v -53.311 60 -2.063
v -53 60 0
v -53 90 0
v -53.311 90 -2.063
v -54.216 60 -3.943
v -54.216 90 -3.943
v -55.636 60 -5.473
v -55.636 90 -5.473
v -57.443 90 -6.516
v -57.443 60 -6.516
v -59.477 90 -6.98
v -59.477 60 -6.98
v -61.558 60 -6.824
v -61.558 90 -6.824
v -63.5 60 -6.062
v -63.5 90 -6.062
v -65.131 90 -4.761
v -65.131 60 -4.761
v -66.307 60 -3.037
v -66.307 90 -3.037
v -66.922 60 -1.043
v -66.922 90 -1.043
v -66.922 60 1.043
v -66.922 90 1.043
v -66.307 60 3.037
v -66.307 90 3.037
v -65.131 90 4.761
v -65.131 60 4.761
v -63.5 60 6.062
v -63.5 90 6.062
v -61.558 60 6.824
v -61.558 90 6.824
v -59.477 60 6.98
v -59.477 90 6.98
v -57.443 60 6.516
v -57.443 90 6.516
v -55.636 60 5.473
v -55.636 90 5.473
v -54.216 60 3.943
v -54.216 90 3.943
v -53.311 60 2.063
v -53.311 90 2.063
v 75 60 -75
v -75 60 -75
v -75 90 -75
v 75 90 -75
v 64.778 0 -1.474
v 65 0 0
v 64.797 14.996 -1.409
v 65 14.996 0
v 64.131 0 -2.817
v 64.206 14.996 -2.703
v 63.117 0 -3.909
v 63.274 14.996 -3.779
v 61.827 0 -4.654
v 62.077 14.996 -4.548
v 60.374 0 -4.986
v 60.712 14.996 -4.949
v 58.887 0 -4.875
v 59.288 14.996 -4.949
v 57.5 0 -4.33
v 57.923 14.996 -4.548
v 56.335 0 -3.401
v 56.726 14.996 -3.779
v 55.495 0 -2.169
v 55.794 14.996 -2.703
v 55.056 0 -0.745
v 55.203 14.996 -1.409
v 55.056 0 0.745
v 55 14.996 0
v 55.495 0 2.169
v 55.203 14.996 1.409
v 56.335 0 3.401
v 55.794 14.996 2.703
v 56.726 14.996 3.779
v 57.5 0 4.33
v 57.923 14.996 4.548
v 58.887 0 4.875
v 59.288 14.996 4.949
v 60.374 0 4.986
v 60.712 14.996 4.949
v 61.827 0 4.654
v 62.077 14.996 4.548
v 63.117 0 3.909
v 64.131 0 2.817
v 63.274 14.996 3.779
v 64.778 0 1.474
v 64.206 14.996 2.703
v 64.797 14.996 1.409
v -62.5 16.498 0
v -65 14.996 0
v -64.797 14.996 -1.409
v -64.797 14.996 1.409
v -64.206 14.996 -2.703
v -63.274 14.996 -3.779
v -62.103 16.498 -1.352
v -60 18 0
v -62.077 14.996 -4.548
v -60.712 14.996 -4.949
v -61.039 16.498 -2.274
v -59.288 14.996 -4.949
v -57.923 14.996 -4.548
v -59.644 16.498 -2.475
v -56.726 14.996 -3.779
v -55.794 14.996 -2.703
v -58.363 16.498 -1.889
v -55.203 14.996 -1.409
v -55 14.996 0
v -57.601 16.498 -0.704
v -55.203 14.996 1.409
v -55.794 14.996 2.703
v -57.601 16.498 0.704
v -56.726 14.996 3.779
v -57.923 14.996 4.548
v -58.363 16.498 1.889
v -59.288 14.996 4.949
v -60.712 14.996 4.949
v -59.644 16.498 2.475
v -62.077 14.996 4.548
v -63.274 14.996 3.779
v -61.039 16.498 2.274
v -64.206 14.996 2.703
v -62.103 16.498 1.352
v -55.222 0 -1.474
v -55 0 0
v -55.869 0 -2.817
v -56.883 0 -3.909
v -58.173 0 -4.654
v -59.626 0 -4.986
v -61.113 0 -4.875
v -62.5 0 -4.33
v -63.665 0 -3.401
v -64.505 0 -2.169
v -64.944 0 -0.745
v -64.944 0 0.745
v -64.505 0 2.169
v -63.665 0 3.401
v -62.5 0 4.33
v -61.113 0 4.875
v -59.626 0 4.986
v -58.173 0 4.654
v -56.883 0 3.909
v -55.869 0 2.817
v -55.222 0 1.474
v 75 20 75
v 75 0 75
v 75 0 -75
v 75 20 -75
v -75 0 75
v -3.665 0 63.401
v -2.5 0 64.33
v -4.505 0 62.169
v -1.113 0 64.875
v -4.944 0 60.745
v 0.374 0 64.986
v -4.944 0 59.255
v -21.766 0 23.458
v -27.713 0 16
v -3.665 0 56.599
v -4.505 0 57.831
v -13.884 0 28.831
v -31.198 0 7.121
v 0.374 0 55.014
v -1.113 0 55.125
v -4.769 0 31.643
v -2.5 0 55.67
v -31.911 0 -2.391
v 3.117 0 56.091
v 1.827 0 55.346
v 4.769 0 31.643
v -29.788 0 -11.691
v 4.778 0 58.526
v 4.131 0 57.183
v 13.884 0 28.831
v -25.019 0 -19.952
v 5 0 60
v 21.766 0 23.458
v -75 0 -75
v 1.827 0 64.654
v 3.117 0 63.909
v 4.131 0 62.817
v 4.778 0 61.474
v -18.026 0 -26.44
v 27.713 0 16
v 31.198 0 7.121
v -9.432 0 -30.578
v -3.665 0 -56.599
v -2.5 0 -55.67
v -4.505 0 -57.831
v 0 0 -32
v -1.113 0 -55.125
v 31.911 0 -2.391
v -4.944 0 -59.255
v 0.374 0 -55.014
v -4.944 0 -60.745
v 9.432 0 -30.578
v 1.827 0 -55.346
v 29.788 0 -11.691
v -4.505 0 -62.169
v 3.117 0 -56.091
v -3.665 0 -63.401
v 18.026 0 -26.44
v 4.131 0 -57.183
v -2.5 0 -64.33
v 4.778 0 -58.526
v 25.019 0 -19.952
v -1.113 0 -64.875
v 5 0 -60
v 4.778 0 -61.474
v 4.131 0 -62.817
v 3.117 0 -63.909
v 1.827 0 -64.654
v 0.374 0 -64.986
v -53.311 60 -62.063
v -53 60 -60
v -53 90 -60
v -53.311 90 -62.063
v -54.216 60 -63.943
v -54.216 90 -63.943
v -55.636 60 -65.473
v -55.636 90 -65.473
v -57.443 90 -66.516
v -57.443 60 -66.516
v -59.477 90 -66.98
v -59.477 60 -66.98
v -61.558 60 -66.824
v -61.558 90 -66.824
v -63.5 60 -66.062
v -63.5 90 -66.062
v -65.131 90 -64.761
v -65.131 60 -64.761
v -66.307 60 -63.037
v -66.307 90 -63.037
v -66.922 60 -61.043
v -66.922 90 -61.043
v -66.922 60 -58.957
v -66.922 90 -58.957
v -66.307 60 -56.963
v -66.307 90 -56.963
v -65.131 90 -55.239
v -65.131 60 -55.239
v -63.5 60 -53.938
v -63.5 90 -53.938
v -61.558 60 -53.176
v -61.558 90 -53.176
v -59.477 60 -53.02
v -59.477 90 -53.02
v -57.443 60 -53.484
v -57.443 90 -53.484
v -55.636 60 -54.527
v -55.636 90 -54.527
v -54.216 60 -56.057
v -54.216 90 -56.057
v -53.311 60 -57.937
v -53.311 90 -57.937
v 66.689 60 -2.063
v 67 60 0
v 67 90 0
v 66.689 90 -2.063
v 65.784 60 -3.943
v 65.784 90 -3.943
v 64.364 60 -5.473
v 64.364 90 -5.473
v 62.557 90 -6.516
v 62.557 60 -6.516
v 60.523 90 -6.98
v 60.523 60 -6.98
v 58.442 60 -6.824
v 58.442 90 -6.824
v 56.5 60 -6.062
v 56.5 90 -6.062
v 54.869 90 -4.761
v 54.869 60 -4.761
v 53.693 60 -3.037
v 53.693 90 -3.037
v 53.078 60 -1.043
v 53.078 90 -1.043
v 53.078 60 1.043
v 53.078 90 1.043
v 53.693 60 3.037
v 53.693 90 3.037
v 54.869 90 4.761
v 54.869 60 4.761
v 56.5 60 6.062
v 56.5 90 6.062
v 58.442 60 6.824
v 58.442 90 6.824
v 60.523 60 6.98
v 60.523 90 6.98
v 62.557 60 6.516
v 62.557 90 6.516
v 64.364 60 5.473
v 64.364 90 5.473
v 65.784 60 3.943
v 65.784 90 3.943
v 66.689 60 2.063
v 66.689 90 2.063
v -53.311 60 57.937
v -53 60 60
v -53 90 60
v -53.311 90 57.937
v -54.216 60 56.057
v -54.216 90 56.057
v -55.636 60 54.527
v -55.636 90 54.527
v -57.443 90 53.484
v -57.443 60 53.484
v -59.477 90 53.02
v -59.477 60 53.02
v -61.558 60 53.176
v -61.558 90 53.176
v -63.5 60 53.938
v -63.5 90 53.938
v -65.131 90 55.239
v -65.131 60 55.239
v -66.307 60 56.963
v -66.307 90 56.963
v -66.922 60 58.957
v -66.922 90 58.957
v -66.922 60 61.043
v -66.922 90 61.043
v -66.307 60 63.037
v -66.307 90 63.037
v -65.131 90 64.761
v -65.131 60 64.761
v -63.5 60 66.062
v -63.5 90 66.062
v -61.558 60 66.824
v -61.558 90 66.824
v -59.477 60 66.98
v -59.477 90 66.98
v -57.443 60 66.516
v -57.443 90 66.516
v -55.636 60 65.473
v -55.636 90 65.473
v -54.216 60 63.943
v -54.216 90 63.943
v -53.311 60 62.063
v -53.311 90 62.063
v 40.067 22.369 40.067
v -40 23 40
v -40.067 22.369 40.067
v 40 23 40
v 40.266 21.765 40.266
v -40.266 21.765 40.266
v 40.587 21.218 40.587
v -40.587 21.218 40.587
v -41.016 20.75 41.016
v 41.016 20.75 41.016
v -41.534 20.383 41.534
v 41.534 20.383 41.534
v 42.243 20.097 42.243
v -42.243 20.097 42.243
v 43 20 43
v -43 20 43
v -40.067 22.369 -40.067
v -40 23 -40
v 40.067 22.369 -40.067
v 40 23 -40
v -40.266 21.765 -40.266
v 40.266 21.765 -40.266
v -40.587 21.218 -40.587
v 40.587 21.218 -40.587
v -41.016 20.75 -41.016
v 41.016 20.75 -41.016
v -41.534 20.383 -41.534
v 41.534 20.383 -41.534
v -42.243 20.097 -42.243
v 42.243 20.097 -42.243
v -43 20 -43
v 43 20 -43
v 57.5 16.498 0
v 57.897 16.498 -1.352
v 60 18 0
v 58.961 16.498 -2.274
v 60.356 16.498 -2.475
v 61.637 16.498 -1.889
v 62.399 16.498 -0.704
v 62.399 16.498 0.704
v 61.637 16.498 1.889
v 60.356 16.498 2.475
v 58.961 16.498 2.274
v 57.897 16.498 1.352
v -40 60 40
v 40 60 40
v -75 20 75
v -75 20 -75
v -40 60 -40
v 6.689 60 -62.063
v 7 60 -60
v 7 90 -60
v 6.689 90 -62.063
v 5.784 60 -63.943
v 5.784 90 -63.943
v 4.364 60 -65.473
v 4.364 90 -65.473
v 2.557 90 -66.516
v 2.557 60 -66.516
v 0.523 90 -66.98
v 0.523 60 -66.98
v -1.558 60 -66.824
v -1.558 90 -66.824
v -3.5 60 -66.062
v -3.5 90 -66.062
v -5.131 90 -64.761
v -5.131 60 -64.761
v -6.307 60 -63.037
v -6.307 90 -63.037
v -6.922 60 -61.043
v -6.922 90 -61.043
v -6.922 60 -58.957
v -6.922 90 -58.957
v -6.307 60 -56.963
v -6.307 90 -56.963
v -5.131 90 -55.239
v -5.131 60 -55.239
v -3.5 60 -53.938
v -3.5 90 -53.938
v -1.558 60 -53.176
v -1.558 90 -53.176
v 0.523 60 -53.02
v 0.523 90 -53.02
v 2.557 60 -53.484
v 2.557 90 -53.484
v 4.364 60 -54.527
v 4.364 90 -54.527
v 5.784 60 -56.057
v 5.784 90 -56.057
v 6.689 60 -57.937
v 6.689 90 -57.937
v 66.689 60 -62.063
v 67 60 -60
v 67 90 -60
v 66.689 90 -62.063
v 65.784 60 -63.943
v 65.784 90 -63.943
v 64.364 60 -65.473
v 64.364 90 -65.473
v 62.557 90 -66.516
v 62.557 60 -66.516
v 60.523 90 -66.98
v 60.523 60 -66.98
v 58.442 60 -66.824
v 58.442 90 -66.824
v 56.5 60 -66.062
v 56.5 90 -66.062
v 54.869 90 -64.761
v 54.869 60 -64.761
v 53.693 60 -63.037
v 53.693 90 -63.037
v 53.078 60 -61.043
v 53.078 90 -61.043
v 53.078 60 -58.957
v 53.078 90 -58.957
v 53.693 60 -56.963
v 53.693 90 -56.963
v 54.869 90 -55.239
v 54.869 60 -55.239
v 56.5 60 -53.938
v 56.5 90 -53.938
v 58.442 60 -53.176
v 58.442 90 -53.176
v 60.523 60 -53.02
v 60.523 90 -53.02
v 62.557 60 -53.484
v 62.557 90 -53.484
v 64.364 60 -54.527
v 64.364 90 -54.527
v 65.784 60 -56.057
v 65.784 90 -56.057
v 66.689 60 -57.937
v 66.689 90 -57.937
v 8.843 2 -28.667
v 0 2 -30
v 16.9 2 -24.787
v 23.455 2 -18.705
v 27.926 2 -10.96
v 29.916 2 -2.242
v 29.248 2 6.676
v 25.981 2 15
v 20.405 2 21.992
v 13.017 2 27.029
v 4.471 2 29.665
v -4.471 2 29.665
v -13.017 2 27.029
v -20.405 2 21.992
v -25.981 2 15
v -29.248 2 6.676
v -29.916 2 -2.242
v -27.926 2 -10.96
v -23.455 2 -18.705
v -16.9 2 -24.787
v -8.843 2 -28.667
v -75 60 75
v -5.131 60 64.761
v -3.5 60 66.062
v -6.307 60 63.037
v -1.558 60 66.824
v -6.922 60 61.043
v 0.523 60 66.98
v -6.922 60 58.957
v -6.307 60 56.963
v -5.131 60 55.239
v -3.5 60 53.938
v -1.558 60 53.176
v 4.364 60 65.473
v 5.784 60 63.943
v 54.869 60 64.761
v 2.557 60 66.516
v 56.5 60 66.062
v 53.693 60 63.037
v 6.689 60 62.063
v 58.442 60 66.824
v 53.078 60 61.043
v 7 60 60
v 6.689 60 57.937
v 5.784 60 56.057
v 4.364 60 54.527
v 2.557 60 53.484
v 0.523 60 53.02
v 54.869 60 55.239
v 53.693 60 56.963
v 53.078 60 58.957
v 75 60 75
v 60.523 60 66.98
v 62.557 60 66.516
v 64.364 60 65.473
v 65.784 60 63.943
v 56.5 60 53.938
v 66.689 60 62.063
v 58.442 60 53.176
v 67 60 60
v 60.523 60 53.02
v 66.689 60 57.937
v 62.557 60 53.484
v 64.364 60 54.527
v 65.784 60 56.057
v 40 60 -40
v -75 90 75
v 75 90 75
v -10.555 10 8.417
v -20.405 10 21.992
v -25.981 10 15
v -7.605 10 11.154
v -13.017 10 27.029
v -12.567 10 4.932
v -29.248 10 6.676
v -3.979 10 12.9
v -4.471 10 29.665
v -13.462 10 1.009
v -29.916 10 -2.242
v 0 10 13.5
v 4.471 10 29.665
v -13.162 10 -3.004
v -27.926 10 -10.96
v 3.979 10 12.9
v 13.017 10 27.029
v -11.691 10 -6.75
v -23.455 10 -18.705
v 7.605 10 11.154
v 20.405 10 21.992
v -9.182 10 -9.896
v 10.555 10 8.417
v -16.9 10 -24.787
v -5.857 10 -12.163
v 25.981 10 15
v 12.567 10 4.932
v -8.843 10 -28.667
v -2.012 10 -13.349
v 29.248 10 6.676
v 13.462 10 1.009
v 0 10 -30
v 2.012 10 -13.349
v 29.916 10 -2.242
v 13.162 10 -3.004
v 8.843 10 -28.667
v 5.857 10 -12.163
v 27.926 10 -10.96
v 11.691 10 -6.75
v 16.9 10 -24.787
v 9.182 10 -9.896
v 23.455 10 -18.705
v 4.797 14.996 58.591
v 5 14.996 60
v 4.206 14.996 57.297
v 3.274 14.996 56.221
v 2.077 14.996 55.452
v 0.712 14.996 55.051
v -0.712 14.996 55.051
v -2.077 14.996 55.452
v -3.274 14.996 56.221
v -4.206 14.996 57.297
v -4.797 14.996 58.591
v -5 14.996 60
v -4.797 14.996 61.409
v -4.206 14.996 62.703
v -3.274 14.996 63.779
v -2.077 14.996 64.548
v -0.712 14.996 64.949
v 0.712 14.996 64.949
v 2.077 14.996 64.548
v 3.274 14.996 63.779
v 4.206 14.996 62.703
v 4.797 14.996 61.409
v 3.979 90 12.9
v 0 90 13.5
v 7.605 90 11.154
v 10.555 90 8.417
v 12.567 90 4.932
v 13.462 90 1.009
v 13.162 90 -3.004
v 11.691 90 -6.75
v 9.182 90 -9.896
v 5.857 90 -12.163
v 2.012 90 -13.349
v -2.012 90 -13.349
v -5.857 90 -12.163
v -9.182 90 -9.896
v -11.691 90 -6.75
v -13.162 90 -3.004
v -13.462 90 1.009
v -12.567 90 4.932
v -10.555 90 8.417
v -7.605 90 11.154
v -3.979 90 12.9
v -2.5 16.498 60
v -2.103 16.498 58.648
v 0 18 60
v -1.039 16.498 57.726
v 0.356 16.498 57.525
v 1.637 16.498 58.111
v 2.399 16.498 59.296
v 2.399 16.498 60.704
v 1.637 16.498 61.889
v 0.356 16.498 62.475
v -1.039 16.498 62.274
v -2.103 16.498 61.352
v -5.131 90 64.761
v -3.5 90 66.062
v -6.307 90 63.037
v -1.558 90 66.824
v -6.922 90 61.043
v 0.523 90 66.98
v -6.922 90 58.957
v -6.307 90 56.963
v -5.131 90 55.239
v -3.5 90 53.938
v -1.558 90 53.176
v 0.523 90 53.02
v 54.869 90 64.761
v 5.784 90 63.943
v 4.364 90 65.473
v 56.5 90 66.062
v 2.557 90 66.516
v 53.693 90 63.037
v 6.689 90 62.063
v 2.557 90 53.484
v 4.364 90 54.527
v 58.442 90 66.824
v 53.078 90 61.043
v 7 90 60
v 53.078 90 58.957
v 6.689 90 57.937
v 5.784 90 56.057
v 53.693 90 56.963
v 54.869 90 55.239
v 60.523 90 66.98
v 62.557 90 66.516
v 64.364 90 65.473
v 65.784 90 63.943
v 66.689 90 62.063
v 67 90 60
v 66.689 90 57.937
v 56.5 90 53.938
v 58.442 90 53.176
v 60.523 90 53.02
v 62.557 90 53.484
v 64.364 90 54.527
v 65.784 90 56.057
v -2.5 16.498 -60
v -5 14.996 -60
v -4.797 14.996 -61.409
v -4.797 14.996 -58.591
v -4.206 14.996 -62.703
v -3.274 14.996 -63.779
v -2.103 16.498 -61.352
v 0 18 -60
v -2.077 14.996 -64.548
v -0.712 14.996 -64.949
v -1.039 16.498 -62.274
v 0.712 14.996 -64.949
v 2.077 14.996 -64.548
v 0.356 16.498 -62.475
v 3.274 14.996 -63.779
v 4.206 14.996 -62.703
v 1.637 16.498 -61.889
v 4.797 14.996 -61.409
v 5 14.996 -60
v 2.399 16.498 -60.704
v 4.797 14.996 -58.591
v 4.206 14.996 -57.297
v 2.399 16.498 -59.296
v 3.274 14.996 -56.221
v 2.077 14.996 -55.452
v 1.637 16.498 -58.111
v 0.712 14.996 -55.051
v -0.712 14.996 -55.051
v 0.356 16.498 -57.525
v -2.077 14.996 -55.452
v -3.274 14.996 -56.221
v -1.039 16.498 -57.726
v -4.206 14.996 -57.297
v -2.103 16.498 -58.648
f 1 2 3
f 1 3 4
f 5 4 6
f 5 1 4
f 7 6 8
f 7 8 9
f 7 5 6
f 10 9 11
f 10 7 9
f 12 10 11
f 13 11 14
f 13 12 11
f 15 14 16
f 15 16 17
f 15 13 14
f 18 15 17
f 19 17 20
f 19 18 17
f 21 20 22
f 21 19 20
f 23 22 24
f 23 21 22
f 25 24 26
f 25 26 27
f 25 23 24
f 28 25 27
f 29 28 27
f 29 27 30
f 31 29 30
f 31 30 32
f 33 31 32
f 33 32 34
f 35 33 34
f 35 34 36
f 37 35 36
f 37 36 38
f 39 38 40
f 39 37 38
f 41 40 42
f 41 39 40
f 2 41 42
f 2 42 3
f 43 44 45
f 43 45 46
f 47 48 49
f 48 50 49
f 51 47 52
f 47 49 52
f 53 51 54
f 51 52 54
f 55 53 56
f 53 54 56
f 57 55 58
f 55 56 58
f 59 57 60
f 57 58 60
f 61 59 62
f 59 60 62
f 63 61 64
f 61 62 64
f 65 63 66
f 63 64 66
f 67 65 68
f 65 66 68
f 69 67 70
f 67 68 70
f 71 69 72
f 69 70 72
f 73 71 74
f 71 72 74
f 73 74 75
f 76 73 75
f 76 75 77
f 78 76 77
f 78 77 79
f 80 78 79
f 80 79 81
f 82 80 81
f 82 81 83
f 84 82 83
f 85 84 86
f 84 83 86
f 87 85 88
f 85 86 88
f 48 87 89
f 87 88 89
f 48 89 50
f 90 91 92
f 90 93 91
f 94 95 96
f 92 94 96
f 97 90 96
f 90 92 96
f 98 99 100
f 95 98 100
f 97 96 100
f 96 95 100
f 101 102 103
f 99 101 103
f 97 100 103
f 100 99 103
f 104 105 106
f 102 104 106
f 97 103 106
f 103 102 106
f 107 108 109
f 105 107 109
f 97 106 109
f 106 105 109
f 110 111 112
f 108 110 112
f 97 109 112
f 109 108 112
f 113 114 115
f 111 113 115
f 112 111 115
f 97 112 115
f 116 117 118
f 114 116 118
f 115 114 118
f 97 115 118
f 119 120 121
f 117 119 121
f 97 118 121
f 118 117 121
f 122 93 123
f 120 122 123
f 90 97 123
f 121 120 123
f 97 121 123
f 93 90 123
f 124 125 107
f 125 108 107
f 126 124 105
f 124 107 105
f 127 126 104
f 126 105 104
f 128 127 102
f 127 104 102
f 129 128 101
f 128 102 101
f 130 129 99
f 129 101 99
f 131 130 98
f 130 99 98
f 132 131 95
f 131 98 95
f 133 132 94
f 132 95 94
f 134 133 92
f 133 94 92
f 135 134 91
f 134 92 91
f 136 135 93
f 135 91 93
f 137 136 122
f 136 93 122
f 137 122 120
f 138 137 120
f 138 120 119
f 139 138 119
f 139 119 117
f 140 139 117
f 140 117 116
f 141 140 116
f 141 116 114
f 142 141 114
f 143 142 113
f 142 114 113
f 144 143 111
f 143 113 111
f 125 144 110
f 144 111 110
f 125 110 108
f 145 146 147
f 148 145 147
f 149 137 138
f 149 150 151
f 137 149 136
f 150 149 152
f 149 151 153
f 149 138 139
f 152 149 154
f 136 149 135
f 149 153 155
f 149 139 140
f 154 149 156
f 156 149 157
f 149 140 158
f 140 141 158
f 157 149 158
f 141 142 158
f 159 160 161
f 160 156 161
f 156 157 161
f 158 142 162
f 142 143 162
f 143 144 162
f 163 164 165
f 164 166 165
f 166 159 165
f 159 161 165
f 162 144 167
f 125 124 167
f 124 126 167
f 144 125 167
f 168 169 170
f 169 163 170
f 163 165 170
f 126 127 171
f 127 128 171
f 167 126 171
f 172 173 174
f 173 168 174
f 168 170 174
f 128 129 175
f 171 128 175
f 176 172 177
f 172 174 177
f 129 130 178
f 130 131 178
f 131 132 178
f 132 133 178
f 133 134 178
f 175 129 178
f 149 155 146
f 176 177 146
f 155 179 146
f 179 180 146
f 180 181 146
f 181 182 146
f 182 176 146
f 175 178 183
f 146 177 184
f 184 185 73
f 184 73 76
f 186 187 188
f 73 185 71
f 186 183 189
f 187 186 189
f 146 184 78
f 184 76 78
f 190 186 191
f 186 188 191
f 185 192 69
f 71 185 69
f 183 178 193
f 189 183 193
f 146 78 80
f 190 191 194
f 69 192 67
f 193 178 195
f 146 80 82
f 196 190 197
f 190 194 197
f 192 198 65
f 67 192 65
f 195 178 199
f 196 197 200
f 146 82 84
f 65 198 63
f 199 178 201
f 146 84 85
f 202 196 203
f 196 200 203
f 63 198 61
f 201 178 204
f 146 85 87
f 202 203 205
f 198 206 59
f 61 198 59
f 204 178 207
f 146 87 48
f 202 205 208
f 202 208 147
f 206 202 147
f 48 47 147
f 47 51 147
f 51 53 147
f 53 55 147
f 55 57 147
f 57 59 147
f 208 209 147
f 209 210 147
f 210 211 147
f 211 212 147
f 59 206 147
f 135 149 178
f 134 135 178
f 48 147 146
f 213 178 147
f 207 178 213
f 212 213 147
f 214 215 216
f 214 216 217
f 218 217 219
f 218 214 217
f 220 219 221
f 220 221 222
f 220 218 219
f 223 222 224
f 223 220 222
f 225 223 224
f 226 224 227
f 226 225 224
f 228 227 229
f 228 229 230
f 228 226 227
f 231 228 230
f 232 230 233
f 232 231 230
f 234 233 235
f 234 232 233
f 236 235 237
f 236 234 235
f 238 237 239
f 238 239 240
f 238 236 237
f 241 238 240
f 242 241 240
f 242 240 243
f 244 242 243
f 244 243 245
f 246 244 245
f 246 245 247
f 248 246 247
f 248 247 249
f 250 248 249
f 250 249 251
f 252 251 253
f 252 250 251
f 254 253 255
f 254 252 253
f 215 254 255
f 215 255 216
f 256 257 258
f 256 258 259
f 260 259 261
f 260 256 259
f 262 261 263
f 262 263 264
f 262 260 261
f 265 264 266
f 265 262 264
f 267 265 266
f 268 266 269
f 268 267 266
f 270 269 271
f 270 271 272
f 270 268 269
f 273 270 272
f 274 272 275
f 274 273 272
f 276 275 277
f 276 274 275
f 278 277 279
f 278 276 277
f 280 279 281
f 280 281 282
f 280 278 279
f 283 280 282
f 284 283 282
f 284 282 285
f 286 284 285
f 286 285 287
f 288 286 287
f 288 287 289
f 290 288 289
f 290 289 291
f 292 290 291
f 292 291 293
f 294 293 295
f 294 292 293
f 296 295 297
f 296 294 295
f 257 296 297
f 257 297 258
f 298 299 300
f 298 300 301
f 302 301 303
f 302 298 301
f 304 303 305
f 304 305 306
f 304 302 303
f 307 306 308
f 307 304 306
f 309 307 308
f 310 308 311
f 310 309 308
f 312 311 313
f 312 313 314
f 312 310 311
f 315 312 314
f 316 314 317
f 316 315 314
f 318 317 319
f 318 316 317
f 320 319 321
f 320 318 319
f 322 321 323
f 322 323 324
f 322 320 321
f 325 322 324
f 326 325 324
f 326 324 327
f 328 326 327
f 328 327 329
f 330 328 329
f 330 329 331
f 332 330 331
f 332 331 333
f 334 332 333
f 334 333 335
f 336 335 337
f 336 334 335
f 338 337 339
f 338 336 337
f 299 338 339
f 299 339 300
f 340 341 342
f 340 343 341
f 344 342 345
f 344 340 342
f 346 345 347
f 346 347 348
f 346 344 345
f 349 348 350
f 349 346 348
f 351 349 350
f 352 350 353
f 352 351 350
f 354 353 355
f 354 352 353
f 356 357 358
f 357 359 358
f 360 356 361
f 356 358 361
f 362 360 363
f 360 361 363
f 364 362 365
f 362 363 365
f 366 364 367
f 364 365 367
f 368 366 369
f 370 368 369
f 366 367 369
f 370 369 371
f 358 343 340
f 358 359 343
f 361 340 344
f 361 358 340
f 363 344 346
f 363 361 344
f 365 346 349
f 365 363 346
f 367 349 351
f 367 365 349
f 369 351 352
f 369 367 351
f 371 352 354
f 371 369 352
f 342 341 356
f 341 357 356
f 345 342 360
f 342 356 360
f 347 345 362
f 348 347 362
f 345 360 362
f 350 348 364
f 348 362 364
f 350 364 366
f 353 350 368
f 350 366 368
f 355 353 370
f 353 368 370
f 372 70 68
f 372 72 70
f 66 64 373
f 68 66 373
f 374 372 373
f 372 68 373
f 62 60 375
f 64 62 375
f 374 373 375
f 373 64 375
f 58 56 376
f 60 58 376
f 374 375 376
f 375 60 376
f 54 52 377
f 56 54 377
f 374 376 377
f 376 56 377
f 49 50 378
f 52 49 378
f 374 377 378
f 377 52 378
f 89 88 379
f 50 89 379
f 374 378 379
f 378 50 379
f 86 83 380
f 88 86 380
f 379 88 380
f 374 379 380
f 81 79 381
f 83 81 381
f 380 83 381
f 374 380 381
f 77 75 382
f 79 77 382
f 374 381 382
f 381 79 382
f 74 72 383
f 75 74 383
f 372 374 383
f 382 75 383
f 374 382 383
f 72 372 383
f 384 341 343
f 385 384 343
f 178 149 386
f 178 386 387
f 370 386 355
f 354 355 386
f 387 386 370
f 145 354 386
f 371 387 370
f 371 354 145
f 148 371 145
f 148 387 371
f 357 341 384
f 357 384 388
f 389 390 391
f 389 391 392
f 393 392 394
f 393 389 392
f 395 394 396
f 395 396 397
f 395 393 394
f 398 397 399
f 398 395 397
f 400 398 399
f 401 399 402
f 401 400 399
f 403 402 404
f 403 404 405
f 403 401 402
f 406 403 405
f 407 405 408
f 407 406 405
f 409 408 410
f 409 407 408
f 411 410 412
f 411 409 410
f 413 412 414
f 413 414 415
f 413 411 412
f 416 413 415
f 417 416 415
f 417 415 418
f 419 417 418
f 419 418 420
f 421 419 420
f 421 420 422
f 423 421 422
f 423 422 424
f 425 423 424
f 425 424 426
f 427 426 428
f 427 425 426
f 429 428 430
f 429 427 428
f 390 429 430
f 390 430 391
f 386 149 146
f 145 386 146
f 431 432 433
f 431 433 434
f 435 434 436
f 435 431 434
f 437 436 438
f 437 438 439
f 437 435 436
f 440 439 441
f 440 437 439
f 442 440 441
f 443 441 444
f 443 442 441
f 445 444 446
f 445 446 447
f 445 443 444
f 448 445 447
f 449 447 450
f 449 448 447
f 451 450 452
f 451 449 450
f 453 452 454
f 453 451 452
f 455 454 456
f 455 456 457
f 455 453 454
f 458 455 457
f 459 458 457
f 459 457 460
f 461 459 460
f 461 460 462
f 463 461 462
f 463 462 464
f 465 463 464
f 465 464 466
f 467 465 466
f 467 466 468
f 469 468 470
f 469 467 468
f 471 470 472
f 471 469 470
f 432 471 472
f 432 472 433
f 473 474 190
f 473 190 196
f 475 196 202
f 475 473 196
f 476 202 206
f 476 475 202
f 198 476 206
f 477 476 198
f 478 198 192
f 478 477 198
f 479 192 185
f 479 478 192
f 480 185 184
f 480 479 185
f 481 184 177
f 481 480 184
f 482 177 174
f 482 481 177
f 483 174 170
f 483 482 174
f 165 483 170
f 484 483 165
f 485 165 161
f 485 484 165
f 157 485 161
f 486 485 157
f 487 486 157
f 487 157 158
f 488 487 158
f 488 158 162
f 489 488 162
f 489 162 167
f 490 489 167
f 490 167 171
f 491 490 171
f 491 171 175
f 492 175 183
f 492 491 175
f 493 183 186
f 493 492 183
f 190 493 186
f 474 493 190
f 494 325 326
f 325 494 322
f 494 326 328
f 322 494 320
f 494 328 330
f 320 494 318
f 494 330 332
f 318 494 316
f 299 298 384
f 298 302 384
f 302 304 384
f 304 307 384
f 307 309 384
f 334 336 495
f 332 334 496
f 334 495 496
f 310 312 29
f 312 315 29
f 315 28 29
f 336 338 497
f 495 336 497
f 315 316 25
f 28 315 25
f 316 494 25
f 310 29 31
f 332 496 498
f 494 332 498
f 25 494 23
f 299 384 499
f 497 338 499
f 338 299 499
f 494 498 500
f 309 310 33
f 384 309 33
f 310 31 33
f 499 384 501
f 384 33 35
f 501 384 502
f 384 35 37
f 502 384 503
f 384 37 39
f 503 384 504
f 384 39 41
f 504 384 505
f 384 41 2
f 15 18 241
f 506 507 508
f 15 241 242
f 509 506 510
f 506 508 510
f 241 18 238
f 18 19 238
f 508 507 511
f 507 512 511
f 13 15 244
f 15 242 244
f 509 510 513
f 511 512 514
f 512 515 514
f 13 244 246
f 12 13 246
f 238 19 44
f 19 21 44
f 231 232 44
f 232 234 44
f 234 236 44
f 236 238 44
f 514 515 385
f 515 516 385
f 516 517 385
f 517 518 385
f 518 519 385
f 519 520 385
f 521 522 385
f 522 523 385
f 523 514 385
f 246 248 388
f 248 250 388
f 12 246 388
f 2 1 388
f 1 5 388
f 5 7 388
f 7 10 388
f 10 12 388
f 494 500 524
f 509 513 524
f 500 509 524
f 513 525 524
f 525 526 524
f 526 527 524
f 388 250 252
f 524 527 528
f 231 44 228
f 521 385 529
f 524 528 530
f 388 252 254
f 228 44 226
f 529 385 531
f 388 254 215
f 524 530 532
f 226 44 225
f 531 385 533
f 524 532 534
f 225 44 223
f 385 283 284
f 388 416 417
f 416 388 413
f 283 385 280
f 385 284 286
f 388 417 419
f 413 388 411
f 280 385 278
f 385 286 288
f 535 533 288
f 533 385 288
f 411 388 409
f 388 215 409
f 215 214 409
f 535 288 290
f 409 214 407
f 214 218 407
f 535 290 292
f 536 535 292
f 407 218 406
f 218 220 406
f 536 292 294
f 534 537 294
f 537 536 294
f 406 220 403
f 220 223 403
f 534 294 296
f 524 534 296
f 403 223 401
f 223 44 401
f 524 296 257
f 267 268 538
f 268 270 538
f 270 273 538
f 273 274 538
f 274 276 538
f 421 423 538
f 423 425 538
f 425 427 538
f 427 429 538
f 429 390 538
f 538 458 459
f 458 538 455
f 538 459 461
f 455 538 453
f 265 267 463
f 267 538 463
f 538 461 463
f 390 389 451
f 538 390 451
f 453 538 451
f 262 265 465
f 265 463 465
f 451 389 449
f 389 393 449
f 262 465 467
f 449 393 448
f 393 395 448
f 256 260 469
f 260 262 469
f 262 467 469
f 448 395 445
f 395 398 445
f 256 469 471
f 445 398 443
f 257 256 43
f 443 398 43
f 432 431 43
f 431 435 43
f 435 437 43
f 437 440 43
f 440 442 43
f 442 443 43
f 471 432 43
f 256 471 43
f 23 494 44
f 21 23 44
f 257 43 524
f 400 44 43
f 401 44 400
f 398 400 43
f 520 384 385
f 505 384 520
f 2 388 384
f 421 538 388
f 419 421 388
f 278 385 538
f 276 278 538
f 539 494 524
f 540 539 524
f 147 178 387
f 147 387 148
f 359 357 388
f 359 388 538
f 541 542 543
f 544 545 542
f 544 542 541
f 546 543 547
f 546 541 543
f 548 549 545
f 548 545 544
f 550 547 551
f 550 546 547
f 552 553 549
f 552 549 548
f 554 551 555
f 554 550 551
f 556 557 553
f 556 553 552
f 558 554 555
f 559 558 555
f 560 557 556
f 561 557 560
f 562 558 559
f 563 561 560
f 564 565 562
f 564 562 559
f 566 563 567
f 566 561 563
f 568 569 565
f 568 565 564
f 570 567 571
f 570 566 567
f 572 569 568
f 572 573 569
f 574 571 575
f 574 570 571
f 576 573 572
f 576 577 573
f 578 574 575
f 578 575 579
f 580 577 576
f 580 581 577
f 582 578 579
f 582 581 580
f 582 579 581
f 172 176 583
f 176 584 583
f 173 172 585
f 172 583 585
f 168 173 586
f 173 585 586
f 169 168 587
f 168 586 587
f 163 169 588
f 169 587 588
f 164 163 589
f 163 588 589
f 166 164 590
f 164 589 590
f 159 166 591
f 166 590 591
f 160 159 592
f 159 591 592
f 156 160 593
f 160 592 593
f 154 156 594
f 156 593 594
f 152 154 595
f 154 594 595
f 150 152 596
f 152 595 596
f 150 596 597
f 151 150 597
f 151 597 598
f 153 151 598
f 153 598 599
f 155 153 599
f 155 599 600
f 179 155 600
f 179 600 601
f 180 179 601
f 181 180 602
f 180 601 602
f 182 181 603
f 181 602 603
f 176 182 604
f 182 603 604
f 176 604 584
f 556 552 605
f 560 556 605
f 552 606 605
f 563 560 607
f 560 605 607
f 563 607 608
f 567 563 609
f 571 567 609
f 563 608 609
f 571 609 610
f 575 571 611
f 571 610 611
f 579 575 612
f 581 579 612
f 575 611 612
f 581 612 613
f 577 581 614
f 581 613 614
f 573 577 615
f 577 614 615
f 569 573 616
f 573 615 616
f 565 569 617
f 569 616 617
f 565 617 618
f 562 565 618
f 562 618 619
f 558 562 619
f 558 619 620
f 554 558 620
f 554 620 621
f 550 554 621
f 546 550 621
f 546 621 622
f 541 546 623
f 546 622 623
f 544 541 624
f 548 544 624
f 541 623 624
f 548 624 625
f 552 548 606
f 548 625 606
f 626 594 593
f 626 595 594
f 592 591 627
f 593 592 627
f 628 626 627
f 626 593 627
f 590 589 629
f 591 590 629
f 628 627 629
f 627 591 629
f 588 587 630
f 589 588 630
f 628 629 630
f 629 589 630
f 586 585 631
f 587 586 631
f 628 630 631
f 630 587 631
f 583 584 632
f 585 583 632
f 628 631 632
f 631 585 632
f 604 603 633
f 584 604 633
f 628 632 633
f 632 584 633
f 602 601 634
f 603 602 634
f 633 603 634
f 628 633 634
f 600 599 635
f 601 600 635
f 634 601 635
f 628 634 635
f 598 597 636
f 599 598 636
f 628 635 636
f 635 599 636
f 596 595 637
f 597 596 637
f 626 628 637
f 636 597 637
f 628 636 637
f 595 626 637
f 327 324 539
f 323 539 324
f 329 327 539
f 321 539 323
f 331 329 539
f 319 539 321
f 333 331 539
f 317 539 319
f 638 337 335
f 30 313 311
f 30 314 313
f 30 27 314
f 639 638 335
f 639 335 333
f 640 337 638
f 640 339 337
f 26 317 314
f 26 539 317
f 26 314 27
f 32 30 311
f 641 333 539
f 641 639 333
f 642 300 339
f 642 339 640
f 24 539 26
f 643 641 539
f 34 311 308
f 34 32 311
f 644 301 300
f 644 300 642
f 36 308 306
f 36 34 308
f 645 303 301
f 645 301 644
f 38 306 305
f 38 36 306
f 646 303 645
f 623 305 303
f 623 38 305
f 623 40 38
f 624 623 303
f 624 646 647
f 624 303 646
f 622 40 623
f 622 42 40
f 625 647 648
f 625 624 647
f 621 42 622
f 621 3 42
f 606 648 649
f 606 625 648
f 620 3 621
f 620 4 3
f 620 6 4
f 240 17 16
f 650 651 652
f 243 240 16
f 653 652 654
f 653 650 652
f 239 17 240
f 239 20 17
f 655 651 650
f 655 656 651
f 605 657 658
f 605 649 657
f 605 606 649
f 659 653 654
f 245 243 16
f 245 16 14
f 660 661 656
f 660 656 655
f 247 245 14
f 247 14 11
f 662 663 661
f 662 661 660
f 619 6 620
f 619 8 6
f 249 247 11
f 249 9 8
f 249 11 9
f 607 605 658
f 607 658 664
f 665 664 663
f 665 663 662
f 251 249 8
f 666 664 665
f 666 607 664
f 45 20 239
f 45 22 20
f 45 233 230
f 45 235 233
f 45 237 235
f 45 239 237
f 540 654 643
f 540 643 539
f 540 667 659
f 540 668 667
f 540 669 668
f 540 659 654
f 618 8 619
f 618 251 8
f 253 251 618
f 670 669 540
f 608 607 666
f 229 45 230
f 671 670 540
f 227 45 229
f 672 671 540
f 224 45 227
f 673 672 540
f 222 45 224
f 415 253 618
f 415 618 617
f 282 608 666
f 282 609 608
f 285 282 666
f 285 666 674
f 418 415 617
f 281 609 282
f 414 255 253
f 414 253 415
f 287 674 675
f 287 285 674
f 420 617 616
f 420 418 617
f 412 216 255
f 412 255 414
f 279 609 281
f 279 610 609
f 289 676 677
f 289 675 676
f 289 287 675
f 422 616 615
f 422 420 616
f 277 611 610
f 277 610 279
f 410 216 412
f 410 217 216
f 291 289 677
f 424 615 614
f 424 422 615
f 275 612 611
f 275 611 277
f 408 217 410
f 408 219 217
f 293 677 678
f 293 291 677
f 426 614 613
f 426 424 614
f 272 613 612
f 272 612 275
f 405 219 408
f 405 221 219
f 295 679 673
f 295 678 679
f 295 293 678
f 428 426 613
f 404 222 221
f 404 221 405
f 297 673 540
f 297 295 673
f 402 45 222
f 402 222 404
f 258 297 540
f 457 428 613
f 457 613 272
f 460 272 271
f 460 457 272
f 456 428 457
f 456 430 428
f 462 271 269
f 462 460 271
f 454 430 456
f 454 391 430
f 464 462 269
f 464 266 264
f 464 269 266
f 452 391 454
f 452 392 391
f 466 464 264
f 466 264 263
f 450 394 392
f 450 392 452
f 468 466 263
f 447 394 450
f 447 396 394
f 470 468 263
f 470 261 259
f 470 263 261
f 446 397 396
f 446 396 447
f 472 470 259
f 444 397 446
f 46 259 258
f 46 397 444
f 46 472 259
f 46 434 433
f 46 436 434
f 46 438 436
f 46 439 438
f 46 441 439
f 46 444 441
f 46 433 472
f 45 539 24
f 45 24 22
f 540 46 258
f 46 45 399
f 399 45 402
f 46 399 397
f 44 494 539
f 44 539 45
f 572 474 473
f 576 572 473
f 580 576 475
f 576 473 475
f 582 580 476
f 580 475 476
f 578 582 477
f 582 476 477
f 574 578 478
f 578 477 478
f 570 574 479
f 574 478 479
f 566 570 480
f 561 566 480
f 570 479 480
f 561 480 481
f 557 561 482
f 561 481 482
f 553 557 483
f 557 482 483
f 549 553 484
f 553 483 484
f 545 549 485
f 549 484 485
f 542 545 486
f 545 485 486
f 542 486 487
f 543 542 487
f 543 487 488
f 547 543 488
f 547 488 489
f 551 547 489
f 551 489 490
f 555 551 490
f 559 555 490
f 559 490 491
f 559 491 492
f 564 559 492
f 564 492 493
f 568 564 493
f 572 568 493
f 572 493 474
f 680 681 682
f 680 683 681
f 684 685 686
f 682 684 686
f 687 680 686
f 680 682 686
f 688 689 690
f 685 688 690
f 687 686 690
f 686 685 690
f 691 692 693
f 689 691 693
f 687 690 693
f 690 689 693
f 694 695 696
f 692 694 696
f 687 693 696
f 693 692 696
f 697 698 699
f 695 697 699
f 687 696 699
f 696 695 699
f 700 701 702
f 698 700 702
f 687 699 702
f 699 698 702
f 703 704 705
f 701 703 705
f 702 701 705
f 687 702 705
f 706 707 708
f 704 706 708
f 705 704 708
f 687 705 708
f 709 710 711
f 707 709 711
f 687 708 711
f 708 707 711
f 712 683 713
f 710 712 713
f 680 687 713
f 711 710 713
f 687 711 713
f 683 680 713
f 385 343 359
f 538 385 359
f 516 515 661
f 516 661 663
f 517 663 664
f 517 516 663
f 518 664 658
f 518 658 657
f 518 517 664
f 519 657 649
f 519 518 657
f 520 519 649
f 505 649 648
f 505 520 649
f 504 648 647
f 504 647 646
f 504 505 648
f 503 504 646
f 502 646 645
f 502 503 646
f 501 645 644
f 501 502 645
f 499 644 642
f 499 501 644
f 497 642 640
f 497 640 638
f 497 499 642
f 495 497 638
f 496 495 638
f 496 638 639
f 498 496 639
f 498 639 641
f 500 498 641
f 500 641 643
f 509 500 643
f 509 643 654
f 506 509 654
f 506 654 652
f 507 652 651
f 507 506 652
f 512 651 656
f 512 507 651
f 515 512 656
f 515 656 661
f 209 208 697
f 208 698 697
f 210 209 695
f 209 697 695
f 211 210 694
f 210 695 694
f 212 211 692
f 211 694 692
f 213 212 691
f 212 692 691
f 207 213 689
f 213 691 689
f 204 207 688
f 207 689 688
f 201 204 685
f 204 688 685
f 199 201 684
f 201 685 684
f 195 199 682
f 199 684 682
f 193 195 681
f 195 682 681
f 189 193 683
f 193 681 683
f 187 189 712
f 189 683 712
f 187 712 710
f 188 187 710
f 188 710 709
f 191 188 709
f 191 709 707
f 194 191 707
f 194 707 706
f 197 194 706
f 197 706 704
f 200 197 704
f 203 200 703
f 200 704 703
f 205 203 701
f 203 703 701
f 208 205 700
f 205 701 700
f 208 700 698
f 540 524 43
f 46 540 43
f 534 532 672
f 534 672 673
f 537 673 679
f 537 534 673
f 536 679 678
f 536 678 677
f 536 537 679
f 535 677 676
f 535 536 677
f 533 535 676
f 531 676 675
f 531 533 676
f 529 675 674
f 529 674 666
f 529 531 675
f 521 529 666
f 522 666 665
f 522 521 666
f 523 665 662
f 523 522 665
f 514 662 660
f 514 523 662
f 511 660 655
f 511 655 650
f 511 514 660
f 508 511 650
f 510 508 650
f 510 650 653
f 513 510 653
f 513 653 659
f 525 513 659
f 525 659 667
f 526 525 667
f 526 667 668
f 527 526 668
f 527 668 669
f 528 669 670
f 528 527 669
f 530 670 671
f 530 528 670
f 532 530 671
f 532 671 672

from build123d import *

# Parameters (mm, degrees)
SKETCH1_W                      = 150
SKETCH1_H                      = 150
BOSS_EXTRUDE1_DEPTH            = 20
SKETCH2_W                      = 80
SKETCH2_H                      = 80
BOSS_EXTRUDE2_DEPTH            = 40
SKETCH3_W                      = 150
SKETCH3_H                      = 150
BOSS_EXTRUDE3_DEPTH            = 30
HOLE2_D                        = 27
HOLE2_CBORE_D                  = 60
HOLE2_CBORE_DEPTH              = 10
M16_START                      = 60
M16_TAPPED_HOLE1_OUTLINE_R     = 7
M16_TAPPED_HOLE1_DEPTH         = 30
F_10_0_10_DIAMETER_HOLE1_D     = 10
F_10_0_10_DIAMETER_HOLE1_DEPTH = 14.995696905
F_10_0_10_DIAMETER_HOLE1_TIP   = 3.004303095
FILLET1_R                      = 3
CHAMFER1_SIZE                  = 2


# Read off the part's stored shape, not the designer's step: M16 Tapped Hole1
with BuildPart() as part:
    # Sketch1 → Boss-Extrude1 (new body)
    with BuildSketch(Plane(origin=(0, 0, 0), x_dir=(1, 0, 0), z_dir=(0, 1, 0))):
        Rectangle(SKETCH1_W, SKETCH1_H)
    extrude(amount=BOSS_EXTRUDE1_DEPTH)

    # Sketch2 → Boss-Extrude2 (add)
    with BuildSketch(Plane(origin=(0, 20, 0), x_dir=(1, 0, 0), z_dir=(0, 1, 0))):
        Rectangle(SKETCH2_W, SKETCH2_H)
    extrude(amount=BOSS_EXTRUDE2_DEPTH)

    # Sketch3 → Boss-Extrude3 (add)
    with BuildSketch(Plane(origin=(0, 60, 0), x_dir=(1, 0, 0), z_dir=(0, 1, 0))):
        Rectangle(SKETCH3_W, SKETCH3_H)
    extrude(amount=BOSS_EXTRUDE3_DEPTH)

    # Hole2 (through all)
    with Locations(Plane(origin=(0, 0, 0), x_dir=(0, 0, -1), z_dir=(0, -1, 0))):
        with Locations((0, 0)):
            CounterBoreHole(HOLE2_D / 2, HOLE2_CBORE_D / 2, HOLE2_CBORE_DEPTH)

    # M16 Tapped Hole1 outline → M16 Tapped Hole1 (cut)
    with BuildSketch(Plane(origin=(0, 0, 0), x_dir=(1, 0, 0), z_dir=(0, 1, 0)).offset(M16_START)):
        with Locations((-60, 0)):
            Circle(M16_TAPPED_HOLE1_OUTLINE_R)
        with Locations((0, -60)):
            Circle(M16_TAPPED_HOLE1_OUTLINE_R)
        with Locations((60, 0)):
            Circle(M16_TAPPED_HOLE1_OUTLINE_R)
        with Locations((0, 60)):
            Circle(M16_TAPPED_HOLE1_OUTLINE_R)
        with Locations((60, -60)):
            Circle(M16_TAPPED_HOLE1_OUTLINE_R)
        with Locations((-60, 60)):
            Circle(M16_TAPPED_HOLE1_OUTLINE_R)
        with Locations((-60, -60)):
            Circle(M16_TAPPED_HOLE1_OUTLINE_R)
        with Locations((60, 60)):
            Circle(M16_TAPPED_HOLE1_OUTLINE_R)
    extrude(amount=M16_TAPPED_HOLE1_DEPTH, mode=Mode.SUBTRACT)

    # Ø10.0 (10) Diameter Hole1
    with Locations(Plane(origin=(0, 0, 0), x_dir=(-1, 0, 0), z_dir=(0, -1, 0))):
        with Locations((0, 0), (0, -60), (60, 0), (-60, 0), (0, 60)):
            Hole(F_10_0_10_DIAMETER_HOLE1_D / 2, depth=F_10_0_10_DIAMETER_HOLE1_DEPTH)
            with Locations((0, 0, -(F_10_0_10_DIAMETER_HOLE1_DEPTH + F_10_0_10_DIAMETER_HOLE1_TIP / 2))):  # 118° drill point
                Cone(0, F_10_0_10_DIAMETER_HOLE1_D / 2, F_10_0_10_DIAMETER_HOLE1_TIP, mode=Mode.SUBTRACT)

    # Fillet1
    fillet1_edges = [part.edges().sort_by_distance(p)[0] for p in [
        (40, 20, 0),
        (0, 20, -40),
        (-40, 20, 0),
        (0, 20, 40),
    ]]
    fillet(fillet1_edges, radius=FILLET1_R)

    # Chamfer1
    chamfer1_edges = [part.edges().sort_by_distance(p)[0] for p in [
        (0, 0, 30),
    ]]
    chamfer(chamfer1_edges, length=CHAMFER1_SIZE)


solid = part.part
